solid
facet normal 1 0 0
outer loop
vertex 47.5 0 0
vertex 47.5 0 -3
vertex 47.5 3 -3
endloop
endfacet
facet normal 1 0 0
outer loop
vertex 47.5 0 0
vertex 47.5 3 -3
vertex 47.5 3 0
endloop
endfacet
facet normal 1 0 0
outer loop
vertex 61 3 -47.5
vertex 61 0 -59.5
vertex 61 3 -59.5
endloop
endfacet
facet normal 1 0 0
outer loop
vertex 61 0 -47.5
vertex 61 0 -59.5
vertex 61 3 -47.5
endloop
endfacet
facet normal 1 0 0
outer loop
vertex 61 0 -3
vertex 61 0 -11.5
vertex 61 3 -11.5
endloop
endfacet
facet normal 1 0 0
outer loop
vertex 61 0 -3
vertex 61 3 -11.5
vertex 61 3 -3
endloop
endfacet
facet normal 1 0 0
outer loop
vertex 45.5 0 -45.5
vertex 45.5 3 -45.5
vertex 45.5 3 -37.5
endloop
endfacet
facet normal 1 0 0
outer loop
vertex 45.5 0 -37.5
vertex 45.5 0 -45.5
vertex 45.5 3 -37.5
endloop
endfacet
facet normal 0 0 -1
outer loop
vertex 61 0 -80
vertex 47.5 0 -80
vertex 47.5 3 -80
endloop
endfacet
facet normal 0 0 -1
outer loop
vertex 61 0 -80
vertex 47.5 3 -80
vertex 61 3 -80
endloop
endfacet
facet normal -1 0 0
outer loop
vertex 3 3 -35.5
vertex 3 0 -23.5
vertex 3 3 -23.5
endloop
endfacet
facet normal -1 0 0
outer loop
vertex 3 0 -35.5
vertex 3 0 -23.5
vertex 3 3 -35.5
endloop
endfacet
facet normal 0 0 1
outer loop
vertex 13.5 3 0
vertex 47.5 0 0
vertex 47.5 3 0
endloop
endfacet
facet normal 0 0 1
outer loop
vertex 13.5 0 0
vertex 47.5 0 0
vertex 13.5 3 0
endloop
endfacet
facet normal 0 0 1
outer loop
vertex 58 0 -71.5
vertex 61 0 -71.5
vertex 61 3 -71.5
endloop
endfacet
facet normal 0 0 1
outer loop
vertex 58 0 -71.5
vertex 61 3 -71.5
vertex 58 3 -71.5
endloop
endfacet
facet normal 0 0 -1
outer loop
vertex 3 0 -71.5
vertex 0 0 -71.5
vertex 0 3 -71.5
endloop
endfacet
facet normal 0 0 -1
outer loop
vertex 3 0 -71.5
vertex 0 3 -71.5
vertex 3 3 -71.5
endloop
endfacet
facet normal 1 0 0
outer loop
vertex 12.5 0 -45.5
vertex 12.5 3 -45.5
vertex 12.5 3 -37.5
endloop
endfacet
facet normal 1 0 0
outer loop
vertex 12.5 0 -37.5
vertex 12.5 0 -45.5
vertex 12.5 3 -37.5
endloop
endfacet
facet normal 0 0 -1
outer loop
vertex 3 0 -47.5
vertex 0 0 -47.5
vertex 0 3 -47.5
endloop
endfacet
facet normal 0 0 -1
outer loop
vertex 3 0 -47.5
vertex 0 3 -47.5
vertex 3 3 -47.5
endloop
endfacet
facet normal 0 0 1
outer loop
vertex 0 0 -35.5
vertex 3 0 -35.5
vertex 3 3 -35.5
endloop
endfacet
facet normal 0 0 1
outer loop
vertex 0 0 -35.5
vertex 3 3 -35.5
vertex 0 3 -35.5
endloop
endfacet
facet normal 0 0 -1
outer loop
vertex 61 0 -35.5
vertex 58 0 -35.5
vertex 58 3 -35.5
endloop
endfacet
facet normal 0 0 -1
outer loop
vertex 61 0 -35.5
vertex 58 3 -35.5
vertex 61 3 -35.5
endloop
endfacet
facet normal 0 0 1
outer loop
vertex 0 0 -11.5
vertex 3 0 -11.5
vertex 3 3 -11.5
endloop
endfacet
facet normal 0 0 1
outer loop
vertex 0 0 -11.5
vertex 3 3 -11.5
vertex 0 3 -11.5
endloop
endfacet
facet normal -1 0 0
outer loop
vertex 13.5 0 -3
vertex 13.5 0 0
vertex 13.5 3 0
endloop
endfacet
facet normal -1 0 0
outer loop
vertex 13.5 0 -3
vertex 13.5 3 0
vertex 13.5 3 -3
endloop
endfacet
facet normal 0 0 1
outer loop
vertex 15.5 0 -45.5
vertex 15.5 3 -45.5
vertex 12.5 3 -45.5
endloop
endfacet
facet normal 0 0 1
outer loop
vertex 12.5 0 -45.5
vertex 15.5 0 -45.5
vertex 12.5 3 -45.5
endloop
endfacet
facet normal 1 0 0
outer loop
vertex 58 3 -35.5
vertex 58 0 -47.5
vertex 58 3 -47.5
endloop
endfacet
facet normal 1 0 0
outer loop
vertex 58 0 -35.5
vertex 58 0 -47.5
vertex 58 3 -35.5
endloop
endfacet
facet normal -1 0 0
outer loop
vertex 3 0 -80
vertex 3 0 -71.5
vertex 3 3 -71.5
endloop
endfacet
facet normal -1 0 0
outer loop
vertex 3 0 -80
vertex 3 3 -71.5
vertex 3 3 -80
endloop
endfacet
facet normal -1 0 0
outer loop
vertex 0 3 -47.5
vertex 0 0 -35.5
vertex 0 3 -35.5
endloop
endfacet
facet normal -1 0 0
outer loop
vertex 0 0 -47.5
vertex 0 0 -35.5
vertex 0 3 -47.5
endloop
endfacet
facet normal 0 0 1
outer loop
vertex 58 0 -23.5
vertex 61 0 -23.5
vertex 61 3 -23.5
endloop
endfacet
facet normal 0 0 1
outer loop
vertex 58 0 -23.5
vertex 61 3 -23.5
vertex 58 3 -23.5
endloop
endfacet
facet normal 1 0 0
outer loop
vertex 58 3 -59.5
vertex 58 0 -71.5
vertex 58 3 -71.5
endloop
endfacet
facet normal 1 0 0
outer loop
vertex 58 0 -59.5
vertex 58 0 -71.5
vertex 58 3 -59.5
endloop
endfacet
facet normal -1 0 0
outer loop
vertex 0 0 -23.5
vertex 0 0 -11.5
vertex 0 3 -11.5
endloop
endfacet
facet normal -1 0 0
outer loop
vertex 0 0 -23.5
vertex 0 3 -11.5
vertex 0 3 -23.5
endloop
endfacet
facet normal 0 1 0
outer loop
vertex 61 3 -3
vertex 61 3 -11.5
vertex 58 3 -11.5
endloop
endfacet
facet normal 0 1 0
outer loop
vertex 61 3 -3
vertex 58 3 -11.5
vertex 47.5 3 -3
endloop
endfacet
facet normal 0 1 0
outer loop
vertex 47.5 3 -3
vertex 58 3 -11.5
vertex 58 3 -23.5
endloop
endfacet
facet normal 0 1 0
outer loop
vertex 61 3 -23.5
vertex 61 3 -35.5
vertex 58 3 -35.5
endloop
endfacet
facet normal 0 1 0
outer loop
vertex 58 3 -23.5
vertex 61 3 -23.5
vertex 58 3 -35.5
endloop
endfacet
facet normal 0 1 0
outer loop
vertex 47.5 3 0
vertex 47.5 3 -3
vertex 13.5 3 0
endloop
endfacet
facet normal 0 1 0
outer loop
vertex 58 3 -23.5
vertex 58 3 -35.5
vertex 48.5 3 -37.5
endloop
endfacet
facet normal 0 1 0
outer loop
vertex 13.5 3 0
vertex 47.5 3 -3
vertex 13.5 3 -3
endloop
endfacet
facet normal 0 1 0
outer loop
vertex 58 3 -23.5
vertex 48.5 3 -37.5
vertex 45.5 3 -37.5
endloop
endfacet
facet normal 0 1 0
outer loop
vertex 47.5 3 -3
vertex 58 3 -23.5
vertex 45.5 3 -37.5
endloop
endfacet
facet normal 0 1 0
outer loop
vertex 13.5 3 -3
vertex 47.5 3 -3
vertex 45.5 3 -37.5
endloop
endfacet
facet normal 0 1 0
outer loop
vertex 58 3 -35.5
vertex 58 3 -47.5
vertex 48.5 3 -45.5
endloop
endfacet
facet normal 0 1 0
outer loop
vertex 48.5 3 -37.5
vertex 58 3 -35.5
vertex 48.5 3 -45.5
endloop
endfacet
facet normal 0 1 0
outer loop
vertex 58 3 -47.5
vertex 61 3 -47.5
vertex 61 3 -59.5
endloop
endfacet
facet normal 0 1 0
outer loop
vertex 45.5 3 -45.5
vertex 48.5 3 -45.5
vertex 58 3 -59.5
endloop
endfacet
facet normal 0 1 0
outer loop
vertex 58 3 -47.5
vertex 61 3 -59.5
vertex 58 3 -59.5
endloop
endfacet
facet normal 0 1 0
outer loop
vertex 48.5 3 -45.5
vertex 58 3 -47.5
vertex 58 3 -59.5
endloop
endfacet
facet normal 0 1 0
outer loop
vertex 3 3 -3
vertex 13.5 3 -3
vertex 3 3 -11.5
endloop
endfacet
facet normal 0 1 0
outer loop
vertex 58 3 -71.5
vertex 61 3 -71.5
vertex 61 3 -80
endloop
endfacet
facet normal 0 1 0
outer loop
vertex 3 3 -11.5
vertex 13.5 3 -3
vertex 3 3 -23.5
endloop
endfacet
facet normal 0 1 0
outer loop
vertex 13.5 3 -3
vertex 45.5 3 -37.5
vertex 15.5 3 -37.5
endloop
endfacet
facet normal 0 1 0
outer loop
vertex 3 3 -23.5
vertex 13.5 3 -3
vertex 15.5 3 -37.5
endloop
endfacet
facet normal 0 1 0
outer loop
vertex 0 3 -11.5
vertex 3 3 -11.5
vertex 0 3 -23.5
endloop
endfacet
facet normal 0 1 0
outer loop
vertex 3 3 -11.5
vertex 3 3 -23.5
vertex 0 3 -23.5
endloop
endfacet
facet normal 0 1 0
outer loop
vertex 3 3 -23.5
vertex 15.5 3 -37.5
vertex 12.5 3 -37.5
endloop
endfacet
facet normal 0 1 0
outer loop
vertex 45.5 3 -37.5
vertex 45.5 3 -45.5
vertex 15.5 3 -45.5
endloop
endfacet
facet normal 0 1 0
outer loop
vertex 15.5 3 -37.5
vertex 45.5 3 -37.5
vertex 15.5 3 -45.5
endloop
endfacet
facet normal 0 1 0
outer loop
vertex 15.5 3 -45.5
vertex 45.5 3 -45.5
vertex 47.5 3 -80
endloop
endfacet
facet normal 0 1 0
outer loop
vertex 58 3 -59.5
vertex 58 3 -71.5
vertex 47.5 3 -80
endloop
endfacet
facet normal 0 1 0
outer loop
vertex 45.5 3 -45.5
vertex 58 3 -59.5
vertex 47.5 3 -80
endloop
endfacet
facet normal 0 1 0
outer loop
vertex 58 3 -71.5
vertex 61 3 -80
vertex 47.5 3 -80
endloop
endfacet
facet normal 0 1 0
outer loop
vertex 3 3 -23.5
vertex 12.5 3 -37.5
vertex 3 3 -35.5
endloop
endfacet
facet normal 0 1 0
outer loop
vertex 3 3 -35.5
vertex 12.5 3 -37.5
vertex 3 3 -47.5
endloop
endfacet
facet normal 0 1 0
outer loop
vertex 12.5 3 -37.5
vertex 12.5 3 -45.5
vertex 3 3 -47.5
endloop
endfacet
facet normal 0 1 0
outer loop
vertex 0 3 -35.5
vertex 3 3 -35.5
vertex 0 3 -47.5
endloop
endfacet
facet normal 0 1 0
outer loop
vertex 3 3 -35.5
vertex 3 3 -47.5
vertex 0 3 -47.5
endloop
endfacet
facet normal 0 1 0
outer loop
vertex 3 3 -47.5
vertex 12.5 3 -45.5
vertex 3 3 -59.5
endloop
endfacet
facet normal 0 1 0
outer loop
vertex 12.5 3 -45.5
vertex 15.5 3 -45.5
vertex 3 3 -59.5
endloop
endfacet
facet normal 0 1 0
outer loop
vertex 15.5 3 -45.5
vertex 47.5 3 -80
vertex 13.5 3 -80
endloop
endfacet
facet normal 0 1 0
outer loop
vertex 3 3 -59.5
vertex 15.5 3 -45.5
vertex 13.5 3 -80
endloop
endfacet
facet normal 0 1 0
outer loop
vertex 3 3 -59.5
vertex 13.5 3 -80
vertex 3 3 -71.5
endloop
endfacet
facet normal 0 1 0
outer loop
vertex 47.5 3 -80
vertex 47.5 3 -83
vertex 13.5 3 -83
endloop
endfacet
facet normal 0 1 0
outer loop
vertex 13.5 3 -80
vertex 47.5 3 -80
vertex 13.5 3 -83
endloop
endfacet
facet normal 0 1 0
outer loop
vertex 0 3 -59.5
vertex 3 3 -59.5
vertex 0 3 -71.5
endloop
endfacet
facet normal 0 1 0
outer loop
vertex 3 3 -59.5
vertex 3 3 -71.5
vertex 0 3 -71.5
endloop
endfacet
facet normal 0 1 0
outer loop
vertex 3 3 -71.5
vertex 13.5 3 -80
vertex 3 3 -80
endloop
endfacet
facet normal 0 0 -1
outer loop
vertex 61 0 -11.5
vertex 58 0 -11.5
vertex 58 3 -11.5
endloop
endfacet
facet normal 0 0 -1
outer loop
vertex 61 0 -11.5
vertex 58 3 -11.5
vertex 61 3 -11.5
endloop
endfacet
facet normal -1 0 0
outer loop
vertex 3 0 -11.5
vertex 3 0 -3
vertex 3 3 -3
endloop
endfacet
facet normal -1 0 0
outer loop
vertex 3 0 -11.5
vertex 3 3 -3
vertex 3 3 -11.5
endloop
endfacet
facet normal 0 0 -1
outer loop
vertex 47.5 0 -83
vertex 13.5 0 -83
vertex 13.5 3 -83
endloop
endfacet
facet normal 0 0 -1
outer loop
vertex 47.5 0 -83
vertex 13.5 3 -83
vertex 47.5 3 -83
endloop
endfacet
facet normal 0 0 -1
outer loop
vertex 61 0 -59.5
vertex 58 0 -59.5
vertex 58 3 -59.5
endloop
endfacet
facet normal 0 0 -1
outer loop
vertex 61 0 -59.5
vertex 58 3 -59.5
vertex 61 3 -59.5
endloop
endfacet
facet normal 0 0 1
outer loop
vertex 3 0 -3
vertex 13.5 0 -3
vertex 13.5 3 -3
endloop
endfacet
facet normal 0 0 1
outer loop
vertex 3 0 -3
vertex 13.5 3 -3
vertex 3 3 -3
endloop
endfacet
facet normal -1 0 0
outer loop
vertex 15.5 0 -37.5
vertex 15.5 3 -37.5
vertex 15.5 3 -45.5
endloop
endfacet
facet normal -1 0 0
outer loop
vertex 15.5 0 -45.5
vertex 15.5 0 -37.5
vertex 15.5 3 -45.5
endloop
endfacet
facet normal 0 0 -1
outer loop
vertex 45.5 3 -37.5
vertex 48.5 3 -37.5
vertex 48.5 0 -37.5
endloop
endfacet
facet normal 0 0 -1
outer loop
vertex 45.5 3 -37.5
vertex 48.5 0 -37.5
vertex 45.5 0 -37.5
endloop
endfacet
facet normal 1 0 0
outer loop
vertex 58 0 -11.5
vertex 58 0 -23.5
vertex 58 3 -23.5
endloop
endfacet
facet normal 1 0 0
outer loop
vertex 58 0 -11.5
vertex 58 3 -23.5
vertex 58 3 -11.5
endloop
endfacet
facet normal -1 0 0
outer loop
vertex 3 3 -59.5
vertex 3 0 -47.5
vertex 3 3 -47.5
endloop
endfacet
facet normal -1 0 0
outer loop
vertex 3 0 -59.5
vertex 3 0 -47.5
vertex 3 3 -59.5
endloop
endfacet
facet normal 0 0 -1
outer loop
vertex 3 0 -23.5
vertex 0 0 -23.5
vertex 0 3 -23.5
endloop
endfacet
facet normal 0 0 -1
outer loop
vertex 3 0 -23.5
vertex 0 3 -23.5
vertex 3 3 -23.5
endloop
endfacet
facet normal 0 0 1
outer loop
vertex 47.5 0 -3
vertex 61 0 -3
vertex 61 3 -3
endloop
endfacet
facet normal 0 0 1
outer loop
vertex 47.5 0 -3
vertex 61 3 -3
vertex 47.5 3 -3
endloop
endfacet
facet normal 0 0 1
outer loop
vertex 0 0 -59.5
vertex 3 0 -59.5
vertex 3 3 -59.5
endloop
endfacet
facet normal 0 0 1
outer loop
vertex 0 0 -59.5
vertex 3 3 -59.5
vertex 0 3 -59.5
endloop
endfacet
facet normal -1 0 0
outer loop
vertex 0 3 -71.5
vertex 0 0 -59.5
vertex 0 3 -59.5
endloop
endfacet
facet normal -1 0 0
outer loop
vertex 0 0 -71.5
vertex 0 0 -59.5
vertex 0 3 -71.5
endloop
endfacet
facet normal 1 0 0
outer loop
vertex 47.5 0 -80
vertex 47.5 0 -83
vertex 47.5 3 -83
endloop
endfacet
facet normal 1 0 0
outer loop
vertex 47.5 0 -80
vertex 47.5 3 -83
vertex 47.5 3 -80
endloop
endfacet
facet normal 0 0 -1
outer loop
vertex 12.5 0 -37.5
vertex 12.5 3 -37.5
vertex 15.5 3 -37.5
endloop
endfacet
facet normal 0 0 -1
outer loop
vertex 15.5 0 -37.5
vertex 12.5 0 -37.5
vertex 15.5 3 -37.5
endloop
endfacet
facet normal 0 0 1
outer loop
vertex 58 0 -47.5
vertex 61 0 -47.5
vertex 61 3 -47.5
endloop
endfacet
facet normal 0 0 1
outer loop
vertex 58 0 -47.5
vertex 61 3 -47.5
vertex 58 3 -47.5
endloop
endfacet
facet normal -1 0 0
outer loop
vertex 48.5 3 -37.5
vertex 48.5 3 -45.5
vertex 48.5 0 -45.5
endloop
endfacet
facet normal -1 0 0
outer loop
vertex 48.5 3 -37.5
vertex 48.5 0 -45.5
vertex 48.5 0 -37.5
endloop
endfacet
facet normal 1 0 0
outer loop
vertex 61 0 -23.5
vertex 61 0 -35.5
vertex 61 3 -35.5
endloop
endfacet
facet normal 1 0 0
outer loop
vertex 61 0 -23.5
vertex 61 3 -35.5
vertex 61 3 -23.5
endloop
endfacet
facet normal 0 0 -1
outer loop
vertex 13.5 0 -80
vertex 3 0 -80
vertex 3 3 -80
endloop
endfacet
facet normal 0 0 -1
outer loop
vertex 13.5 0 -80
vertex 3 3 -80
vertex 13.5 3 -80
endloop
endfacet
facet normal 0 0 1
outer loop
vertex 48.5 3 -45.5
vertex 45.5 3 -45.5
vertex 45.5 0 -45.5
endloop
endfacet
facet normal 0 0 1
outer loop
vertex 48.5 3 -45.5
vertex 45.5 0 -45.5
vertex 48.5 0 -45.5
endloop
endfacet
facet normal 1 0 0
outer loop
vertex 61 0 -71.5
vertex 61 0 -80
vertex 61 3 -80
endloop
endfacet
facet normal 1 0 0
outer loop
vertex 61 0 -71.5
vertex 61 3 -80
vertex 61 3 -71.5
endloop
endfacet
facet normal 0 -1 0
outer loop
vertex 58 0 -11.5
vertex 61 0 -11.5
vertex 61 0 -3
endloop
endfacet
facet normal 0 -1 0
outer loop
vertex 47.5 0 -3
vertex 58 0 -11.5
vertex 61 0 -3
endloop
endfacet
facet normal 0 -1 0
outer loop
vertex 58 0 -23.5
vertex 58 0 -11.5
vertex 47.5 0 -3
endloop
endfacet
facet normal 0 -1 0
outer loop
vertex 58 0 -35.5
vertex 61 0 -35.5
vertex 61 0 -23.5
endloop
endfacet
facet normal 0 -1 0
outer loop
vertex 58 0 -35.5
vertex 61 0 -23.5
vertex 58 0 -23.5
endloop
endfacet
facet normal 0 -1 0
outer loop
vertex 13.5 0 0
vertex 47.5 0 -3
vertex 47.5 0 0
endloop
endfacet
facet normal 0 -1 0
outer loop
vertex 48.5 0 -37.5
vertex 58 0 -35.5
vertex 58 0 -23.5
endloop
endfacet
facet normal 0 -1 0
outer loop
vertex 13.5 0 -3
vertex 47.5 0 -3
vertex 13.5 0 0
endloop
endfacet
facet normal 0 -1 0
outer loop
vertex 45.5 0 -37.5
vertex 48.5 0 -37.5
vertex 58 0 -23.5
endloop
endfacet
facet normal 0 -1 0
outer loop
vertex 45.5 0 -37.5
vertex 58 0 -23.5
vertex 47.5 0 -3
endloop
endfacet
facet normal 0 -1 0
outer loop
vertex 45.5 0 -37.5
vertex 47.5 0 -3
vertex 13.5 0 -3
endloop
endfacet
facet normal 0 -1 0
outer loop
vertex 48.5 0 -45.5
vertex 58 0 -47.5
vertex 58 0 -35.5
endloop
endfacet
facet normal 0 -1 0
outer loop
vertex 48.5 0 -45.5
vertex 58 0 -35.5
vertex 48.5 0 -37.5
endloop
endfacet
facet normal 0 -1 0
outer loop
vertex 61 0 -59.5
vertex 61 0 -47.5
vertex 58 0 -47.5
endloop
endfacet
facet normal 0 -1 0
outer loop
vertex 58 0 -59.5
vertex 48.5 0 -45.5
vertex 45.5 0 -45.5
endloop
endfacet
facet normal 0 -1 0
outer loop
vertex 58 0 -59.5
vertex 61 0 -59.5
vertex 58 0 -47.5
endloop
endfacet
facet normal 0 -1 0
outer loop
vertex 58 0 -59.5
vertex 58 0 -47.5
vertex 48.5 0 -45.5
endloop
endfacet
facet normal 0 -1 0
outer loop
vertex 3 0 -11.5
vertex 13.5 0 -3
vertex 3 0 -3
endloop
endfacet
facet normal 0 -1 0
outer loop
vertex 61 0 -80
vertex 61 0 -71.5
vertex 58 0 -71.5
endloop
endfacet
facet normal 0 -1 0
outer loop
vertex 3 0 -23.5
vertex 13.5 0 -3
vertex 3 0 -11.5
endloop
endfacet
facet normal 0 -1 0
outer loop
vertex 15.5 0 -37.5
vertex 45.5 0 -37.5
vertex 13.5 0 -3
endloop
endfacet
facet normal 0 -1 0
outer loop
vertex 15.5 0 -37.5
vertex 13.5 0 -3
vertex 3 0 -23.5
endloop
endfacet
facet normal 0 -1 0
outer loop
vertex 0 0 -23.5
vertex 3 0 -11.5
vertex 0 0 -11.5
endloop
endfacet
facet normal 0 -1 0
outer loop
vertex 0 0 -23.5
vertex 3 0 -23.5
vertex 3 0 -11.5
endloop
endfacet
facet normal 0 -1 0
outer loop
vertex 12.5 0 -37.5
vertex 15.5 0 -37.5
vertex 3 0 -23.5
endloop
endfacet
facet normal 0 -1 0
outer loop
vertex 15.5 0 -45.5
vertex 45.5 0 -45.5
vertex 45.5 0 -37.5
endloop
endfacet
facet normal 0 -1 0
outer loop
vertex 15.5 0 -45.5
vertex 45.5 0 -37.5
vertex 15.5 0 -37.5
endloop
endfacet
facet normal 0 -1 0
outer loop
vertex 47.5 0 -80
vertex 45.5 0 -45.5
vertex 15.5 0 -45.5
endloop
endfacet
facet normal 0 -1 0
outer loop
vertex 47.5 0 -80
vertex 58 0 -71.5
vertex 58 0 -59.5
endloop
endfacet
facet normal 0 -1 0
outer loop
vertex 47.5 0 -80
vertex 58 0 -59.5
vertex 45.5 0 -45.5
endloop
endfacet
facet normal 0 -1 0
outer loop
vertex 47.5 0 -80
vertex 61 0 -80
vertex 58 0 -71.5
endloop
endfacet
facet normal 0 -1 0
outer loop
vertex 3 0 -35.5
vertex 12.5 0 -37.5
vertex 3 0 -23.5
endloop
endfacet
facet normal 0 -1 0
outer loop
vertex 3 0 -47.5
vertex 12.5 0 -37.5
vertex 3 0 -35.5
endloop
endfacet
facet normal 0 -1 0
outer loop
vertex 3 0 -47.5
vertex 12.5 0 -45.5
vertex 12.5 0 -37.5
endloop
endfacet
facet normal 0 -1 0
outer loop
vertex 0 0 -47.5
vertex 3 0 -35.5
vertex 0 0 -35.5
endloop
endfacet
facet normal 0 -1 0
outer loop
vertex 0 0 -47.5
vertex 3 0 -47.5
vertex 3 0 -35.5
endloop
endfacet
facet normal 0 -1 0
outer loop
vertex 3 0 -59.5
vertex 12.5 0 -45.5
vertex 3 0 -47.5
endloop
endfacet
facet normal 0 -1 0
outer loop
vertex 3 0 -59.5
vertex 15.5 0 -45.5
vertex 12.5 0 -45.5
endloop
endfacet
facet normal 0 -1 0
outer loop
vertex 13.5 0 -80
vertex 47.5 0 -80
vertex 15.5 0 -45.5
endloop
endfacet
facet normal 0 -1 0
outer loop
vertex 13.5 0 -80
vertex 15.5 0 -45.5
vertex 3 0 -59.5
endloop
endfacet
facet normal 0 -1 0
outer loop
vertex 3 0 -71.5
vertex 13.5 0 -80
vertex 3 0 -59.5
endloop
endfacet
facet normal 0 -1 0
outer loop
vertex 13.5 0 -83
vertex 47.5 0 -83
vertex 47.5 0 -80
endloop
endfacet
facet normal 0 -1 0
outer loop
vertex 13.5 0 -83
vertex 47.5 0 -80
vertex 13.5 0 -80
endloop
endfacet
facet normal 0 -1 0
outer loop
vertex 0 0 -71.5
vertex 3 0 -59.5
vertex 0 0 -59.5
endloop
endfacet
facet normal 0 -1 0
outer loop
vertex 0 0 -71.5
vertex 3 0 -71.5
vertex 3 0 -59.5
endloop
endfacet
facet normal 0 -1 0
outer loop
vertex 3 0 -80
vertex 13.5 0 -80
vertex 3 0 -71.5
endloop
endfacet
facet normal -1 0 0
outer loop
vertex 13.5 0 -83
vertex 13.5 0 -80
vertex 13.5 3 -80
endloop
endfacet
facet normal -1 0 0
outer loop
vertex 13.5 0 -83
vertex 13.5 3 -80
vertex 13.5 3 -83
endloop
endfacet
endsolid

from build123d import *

# Parameters (mm, degrees)
SALIENTE_EXTRUIR1_DEPTH = 3
CORTAR_EXTRUIR1_DEPTH   = 10


with BuildPart() as part:
    # Croquis1 → Saliente-Extruir1 (new body)
    with BuildSketch(Plane(origin=(0, 0, 0), x_dir=(1, 0, 0), z_dir=(0, 1, 0))):
        Polygon((3, 35.5), (0, 35.5), (0, 47.5), (3, 47.5), (3, 59.5), (0, 59.5), (0, 71.5), (3, 71.5), (3, 80), (13.5, 80), (13.5, 83), (47.5, 83), (47.5, 80), (61, 80), (61, 71.5), (58, 71.5), (58, 59.5), (61, 59.5), (61, 47.5), (58, 47.5), (58, 35.5), (61, 35.5), (61, 23.5), (58, 23.5), (58, 11.5), (61, 11.5), (61, 3), (47.5, 3), (47.5, 0), (13.5, 0), (13.5, 3), (3, 3), (3, 11.5), (0, 11.5), (0, 23.5), (3, 23.5), align=None)
    extrude(amount=SALIENTE_EXTRUIR1_DEPTH)

    # Croquis2 → Cortar-Extruir1 (cut)
    with BuildSketch(Plane(origin=(0, 3, 0), x_dir=(1, 0, 0), z_dir=(0, 1, 0))):
        Polygon((15.5, 41.5), (15.5, 45.5), (12.5, 45.5), (12.5, 37.5), (15.5, 37.5), align=None)
        Polygon((45.5, 37.5), (45.5, 41.5), (45.5, 45.5), (48.5, 45.5), (48.5, 37.5), align=None)
    extrude(amount=-CORTAR_EXTRUIR1_DEPTH, mode=Mode.SUBTRACT)


solid = part.part
